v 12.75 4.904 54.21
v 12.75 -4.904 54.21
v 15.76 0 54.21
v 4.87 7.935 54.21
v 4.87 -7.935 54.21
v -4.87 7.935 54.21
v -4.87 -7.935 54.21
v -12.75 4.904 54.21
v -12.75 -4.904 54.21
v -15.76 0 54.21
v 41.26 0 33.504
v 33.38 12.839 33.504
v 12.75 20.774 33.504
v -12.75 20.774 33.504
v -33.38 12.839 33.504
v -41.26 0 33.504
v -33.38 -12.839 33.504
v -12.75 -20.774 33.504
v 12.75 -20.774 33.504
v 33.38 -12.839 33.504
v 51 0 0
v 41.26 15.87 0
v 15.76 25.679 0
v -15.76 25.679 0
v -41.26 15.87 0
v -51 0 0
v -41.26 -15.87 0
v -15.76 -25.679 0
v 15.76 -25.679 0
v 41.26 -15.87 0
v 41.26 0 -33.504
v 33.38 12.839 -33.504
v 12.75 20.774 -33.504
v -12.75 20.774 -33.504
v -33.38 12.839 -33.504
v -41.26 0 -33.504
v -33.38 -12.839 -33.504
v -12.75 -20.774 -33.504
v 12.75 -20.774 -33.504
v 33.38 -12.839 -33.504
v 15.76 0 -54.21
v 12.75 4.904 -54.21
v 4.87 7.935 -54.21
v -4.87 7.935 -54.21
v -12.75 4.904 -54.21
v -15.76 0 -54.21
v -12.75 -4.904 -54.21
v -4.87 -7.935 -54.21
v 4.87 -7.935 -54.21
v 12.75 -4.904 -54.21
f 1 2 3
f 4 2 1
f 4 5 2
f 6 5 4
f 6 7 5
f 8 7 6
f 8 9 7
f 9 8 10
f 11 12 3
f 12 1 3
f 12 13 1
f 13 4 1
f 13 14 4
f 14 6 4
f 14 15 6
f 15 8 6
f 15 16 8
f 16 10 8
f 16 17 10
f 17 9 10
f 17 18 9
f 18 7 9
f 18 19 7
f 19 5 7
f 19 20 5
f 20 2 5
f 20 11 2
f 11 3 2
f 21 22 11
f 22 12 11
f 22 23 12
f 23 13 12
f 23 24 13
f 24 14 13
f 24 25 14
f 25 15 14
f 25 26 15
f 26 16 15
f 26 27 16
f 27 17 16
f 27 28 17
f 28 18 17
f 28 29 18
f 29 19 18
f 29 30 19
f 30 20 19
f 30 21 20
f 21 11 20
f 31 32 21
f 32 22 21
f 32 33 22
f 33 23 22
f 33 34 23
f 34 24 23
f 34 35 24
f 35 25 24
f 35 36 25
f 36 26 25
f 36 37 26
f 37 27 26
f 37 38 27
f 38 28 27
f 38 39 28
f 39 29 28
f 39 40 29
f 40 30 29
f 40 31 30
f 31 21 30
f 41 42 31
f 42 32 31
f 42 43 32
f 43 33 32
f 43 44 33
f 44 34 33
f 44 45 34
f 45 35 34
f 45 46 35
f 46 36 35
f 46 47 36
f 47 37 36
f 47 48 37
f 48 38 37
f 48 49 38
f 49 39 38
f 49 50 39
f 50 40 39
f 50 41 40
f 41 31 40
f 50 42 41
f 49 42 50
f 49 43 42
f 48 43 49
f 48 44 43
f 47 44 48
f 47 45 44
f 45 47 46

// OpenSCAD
// Generated by SolidPython 1.0.1 on 2020-07-29 00:46:53


scale(v = [17, 9, 19]) {
	sphere(r = 3);
}
/***********************************************
*********      SolidPython code:      **********
************************************************
 
# import packages: SolidPython
from solid import *
from solid.utils import *
from itertools import chain, combinations, permutations


class Resize:

    def __init__(self, scad_file):
        self.scad_file = scad_file
        #self.scad_file = import_scad(scad_file)
        # cone/cylinder param:
        self.r1 = 0
        self.r2 = 0
        self.h = 0
        # rectangular prism param:
        self.w = 0
        self.l = 0
        # ellipse param:
        self.r = 0

    # import OpenScad code (file name corresponds to shape)


    # classify shape + parameters
    def assign(self, param1, param2, param3):
        if self.scad_file == 'cone.scad':
            self.r1 = param1
            self.r2 = param2
            self.h = param3
        elif self.scad_file == 'cylinder.scad':
            self.r1 = param1
            self.r2 = param2
            self.h = param3
        elif self.scad_file == 'rectangularPrism.scad':
            self.h = param1
            self.l = param2
            self.w = param3
        else:
            self.r = param1
            self.h = param2

    # resize parameters
    def iterate(self):
        x = range(3, 20, 2)
        i = 1
        if self.scad_file == 'cone.scad':
            tempList = list(permutations(x, 2))
            for temp in tempList:
                param1 = temp[0]
                param2 = temp[1]
                filepath = 'produced_scad_files/' + 'cone' + str(param1) + '_' + str(param2) + '_' + '.scad'
                scad_render_to_file(cylinder(h=param1, r1=param2, r2=0), filepath)

        elif self.scad_file == 'cylinder.scad':
            tempList = list(permutations(x, 3))
            for temp in tempList:
                param1 = temp[0]
                param2 = temp[1]
                filepath = 'produced_scad_files/' + 'cylinder' + str(param1) + '_' + str(param2) + '_' + '.scad'
                scad_render_to_file(cylinder(h=param1, r1=param2, r2=param2), filepath)

        elif self.scad_file == 'rectangularPrism.scad':
            tempList = list(permutations(x, 3))
            for temp in tempList:
                param1 = temp[0]
                param2 = temp[1]
                param3 = temp[2]
                filepath = 'produced_scad_files/' + 'rectangularPrism' + str(param1) + '_' + str(param2) + '_' + str(
                    param3) + '.scad'
                scad_render_to_file(cube(size=(param1, param2, param3)), filepath)

        elif self.scad_file == 'ellipse.scad':
            tempList = list(permutations(x, 4))
            for temp in tempList:
                param1 = temp[0]
                param2 = temp[1]
                param3 = temp[2]
                param4 = temp[3]
                filepath = 'produced_scad_files/' + 'ellipse' + str(param1) + '_' + str(param2) + '_' + str(param3) + '_' + str(param4) + '.scad'
                scad_render_to_file(scale([param1, param2, param3])(sphere(r=param4)), filepath)

    def render_to_scadfile(self):
        scad_render_to_file(scad, 'example.scad') 
 
************************************************/
